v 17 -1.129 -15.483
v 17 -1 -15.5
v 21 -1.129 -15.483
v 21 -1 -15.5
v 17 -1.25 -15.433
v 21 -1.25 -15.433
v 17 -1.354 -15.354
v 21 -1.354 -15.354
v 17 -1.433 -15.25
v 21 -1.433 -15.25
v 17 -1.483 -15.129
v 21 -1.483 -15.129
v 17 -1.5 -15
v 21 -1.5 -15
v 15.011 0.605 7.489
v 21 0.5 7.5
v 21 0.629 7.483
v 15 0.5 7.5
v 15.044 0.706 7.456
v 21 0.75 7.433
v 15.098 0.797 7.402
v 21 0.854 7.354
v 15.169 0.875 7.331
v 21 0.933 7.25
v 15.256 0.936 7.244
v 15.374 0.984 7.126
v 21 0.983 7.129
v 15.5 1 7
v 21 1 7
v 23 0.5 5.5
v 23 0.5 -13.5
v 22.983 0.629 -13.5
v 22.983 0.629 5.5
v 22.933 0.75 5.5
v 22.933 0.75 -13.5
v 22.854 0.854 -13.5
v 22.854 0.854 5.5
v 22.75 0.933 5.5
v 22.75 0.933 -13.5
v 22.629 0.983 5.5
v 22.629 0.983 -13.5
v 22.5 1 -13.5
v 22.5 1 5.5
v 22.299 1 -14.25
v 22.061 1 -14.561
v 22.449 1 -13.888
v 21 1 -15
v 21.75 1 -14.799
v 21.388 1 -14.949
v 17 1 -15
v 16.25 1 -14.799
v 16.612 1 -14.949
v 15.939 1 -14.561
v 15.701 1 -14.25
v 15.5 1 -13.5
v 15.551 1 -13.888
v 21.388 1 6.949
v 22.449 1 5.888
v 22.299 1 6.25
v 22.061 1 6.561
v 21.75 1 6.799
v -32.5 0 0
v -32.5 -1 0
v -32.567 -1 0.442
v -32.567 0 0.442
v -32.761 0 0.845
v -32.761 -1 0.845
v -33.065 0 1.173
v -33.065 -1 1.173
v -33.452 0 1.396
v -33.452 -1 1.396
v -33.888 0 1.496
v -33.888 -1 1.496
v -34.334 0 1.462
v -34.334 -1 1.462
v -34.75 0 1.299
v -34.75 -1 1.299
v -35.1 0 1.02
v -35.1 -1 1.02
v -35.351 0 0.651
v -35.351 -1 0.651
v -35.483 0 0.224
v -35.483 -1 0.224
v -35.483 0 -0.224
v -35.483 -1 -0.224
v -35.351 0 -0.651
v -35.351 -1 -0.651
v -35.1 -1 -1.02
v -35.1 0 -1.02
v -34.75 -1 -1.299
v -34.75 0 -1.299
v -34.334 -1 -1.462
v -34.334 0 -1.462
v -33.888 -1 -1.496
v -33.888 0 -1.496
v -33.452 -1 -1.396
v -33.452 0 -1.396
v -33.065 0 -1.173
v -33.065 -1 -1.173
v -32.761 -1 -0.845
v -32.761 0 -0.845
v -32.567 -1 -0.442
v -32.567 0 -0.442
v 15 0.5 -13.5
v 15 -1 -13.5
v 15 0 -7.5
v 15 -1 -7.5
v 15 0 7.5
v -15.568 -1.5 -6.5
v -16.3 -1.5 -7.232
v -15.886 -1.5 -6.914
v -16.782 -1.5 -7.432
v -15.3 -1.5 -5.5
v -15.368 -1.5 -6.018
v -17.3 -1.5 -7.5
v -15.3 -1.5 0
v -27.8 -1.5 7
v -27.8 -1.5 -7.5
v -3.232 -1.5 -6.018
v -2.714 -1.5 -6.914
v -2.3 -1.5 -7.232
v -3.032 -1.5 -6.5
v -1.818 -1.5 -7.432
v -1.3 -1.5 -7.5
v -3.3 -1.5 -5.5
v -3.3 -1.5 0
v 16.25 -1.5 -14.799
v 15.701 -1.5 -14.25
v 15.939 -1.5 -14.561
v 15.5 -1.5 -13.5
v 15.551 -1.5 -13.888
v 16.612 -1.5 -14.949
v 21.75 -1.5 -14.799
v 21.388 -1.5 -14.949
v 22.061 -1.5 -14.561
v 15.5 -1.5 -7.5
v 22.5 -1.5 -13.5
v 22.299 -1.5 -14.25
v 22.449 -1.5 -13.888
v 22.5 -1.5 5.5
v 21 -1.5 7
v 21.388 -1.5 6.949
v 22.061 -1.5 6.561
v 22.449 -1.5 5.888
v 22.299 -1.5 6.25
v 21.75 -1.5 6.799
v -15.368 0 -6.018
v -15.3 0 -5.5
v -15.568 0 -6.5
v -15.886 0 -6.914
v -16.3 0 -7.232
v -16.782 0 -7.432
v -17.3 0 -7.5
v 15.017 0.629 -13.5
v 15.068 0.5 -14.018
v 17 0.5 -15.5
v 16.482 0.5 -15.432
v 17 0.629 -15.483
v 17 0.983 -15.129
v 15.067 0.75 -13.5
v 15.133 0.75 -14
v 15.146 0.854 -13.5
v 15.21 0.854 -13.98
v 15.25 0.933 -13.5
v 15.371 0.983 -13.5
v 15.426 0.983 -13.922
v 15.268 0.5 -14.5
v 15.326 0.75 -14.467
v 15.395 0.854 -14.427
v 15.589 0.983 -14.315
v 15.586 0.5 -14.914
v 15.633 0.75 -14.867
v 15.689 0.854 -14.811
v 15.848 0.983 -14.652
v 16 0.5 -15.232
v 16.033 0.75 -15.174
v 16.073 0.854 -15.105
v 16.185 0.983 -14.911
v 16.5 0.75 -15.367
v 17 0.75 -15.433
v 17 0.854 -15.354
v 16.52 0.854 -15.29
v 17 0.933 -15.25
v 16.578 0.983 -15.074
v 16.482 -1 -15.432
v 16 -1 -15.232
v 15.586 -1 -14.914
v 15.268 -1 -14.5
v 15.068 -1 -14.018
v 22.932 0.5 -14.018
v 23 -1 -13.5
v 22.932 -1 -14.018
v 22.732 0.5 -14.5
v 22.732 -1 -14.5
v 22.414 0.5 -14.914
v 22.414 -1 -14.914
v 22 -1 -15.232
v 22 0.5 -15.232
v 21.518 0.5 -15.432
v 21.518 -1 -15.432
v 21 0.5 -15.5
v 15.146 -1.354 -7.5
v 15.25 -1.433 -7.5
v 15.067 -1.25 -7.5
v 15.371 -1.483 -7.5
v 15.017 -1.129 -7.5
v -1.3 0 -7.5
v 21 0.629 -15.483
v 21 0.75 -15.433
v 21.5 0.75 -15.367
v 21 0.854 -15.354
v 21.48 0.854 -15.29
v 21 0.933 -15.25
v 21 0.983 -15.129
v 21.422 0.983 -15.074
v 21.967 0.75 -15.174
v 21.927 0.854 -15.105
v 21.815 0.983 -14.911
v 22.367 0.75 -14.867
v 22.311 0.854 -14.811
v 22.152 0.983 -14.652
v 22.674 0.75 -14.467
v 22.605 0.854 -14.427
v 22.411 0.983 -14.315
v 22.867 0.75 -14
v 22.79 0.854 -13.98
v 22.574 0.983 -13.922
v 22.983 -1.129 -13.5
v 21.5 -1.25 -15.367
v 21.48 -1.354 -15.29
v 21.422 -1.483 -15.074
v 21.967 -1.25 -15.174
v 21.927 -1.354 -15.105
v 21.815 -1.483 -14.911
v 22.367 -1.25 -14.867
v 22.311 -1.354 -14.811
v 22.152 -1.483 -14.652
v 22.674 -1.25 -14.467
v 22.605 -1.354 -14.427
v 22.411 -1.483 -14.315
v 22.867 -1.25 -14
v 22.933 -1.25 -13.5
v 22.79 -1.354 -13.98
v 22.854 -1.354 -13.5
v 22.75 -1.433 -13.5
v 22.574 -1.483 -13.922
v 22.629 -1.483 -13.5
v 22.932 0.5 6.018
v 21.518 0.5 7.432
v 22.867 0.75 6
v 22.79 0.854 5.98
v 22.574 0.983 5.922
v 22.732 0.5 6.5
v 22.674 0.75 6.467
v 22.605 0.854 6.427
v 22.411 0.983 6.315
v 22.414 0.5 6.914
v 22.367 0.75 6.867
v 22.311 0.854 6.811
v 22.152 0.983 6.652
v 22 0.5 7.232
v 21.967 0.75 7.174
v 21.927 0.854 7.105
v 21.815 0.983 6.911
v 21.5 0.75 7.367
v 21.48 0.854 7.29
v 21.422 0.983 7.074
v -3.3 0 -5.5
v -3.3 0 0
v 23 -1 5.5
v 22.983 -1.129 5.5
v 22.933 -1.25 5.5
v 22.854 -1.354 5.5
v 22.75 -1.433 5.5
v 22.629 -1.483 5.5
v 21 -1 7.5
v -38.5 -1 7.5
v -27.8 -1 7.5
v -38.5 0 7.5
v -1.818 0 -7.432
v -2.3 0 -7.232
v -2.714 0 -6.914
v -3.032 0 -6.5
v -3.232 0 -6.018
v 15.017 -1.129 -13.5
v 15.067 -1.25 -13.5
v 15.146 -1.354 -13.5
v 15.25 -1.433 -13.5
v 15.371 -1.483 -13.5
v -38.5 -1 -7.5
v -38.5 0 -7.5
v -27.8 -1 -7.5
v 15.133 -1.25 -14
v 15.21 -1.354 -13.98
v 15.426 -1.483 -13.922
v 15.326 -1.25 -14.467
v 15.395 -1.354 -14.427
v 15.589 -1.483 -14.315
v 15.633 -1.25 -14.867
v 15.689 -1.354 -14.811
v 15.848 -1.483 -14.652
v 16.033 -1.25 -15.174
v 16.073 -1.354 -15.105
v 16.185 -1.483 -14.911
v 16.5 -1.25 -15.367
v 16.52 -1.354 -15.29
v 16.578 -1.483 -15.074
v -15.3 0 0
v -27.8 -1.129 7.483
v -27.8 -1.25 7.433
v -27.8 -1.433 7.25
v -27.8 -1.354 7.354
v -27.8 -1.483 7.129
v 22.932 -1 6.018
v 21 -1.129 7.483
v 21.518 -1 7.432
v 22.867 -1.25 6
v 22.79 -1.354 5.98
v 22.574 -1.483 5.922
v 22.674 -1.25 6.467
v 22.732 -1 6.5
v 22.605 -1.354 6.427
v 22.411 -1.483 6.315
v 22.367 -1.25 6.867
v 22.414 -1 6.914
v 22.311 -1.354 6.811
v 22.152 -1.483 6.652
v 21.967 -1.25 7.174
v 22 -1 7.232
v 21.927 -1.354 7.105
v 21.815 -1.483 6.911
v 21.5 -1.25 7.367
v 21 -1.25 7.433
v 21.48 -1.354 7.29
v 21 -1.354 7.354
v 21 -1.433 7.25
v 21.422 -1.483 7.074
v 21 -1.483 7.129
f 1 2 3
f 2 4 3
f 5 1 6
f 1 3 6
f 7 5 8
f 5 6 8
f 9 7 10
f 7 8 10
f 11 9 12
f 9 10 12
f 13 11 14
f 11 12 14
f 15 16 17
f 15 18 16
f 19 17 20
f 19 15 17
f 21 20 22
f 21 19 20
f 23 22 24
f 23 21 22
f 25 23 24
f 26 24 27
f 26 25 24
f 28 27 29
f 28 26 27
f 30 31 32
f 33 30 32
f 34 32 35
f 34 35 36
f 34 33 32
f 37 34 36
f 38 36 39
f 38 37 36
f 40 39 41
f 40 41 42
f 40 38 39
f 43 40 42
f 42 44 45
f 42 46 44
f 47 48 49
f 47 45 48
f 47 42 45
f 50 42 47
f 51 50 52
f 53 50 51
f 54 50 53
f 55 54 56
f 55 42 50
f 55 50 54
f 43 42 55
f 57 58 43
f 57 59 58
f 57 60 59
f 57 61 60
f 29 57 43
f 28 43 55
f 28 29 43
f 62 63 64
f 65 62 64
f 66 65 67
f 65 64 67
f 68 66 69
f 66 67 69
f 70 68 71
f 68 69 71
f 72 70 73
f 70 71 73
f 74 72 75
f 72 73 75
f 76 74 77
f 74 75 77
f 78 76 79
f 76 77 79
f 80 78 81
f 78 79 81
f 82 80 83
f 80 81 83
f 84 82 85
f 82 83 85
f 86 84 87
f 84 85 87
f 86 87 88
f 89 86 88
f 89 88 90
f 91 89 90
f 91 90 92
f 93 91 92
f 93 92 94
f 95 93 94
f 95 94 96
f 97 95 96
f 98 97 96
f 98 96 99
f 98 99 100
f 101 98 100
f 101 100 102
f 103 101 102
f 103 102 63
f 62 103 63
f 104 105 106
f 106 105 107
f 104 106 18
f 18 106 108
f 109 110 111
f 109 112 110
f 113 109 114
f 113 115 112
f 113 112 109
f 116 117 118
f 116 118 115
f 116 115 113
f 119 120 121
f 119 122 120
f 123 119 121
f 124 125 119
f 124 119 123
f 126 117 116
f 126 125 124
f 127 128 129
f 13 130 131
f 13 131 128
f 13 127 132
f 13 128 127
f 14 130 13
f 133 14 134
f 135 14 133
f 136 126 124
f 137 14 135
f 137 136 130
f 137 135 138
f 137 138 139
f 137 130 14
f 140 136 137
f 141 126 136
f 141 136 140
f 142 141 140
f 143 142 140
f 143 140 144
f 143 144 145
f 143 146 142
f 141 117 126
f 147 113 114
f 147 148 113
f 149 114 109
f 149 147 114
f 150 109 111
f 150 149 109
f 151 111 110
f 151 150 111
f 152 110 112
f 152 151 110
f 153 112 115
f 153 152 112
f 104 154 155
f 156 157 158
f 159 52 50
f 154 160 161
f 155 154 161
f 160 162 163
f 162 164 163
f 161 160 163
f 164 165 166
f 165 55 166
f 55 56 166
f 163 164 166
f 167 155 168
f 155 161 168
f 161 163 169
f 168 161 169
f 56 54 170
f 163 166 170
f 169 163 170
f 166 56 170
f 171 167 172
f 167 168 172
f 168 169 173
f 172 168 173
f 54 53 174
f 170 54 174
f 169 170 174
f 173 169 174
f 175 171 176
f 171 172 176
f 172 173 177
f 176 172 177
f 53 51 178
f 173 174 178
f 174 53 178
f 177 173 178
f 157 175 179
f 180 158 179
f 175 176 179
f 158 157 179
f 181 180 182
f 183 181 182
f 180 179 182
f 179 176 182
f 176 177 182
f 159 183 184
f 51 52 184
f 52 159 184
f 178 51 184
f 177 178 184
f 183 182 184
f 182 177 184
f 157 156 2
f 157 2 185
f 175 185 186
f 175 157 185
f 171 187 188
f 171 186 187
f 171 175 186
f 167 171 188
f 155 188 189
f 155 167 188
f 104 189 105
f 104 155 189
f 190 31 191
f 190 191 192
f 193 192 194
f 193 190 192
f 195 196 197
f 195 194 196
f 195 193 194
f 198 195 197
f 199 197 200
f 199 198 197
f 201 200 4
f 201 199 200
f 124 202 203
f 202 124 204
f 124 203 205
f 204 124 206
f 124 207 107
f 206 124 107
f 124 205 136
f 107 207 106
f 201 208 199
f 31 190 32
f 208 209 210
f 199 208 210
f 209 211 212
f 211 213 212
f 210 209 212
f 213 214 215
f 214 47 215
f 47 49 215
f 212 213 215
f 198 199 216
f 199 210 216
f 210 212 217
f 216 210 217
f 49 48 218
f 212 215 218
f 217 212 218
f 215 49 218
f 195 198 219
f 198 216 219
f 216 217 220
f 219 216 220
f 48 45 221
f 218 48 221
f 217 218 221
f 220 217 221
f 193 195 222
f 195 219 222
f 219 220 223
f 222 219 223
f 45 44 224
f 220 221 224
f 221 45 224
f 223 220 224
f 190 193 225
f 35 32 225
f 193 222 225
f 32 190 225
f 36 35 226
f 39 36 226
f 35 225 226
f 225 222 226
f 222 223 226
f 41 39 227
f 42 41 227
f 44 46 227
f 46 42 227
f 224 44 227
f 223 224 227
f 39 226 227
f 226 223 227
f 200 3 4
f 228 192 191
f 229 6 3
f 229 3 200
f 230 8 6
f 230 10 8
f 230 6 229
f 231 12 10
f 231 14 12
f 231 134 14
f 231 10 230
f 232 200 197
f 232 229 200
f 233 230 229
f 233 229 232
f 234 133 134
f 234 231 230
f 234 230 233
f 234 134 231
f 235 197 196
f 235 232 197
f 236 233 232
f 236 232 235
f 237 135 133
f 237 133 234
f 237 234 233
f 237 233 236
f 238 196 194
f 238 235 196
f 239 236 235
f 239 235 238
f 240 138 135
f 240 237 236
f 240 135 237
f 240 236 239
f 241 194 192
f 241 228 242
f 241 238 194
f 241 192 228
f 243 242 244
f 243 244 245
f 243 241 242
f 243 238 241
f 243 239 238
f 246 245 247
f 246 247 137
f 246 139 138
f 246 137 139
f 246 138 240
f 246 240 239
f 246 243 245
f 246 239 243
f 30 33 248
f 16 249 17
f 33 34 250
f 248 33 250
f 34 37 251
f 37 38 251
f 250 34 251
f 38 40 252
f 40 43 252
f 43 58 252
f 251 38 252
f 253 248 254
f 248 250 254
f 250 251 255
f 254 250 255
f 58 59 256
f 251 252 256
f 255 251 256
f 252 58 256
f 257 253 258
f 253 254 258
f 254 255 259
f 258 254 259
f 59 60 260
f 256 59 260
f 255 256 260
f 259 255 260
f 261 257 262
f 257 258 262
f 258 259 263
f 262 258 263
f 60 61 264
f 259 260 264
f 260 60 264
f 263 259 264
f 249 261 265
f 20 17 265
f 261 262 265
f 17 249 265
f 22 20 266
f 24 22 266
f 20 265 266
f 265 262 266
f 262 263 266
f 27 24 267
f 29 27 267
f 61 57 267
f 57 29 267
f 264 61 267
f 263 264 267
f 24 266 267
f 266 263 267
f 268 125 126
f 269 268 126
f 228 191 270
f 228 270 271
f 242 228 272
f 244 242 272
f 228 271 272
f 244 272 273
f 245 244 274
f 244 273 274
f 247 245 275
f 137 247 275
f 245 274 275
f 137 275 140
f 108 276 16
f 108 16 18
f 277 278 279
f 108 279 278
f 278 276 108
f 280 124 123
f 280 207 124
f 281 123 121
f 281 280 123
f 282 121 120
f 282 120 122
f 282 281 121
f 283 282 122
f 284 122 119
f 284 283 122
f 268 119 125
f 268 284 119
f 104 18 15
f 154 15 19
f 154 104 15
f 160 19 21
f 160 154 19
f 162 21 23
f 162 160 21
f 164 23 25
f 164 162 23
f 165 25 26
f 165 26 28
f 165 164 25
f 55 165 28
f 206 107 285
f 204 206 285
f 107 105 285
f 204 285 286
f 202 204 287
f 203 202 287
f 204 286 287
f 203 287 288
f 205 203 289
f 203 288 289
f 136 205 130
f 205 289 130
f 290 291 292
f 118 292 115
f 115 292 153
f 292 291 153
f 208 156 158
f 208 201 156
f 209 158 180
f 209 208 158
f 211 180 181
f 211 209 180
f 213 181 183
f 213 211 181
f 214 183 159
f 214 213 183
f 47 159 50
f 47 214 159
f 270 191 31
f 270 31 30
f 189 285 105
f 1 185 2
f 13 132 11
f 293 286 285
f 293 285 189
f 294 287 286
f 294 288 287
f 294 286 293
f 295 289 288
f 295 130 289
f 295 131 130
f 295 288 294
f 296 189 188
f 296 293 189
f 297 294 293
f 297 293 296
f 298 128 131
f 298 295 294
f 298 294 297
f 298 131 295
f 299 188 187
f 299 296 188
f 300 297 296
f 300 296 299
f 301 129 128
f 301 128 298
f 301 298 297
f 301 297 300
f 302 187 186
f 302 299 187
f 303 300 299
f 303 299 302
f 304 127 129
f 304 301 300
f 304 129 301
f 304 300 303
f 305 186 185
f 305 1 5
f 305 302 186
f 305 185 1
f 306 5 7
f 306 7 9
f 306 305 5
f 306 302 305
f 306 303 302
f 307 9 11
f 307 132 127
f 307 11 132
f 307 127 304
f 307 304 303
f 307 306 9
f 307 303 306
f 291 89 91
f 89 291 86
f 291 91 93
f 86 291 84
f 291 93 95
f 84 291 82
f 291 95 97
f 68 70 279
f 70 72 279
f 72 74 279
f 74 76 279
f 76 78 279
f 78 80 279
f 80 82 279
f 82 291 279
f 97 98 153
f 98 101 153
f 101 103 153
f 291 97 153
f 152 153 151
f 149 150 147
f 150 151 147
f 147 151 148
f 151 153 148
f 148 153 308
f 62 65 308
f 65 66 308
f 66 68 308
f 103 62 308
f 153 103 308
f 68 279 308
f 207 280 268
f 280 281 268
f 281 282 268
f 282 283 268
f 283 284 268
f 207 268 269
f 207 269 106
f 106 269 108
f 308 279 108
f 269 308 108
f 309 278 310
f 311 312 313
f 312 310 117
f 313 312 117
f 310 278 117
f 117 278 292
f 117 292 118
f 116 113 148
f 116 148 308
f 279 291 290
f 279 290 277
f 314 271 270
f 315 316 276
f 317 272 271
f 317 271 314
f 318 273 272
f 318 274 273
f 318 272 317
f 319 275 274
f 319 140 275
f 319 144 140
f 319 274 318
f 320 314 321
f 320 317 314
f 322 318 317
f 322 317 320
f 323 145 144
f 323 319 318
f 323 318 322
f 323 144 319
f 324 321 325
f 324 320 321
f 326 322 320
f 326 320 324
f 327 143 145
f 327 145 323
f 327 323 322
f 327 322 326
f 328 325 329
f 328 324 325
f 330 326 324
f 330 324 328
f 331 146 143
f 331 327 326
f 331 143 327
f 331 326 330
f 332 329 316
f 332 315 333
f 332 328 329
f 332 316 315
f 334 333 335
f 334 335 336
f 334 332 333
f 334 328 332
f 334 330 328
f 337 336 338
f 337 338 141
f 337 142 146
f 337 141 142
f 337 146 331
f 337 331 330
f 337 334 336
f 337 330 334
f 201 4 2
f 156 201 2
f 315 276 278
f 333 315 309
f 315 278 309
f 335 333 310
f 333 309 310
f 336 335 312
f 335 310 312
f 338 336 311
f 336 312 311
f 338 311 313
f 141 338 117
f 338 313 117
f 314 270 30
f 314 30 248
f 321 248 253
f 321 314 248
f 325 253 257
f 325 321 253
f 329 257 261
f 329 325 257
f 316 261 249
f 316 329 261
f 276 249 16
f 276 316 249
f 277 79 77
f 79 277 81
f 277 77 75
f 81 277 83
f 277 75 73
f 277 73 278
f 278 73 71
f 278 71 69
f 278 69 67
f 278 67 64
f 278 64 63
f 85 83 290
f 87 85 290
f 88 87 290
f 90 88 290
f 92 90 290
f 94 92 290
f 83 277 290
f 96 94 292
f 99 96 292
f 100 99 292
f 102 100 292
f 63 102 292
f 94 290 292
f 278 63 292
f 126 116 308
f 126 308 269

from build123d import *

# Parameters (mm, degrees)
F0_W      = 63.5
F0_H      = 15
F1_DEPTH  = 1.5
F2_W      = 10
F2_H      = 8
F3_DEPTH  = 1.5
F4_W      = 12
F4_H      = 7.5
F5_DEPTH  = 1.501
F6_R      = 1.5
F7_DEPTH  = 1.501
F8_W      = 10.7
F8_H      = 0.5
F9_DEPTH  = 15.001
F10_W     = 2
F10_H     = 1.5
F11_DEPTH = 23.001
F12_W     = 8
F12_H     = 23
F13_DEPTH = 1
F14_R     = 2
F15_R     = 0.5


with BuildPart() as f1:
    # F0 (on Front) → F1 (new body)
    with BuildSketch(Plane.XZ):
        with Locations((-6.75, 0)):
            Rectangle(F0_W, F0_H)
    extrude(amount=F1_DEPTH)

    # F2 (on face) → F3 (join, through all)
    with BuildSketch(Plane.XZ.offset(1.5)):
        with Locations((20, -11.5)):
            Rectangle(F2_W, F2_H)
    extrude(amount=-F3_DEPTH)

    # F4 (on face) → F5 (cut, through all)
    with BuildSketch(Plane.XZ.offset(1.5)):
        with Locations((-9.3, -3.75)):
            Rectangle(F4_W, F4_H)
    extrude(amount=-F5_DEPTH, mode=Mode.SUBTRACT)

    # F6 (on face) → F7 (cut, through all)
    with BuildSketch(Plane.XZ.offset(1.5)):
        with Locations((-34, 0)):
            Circle(F6_R)
    extrude(amount=-F7_DEPTH, mode=Mode.SUBTRACT)

    # F8 (on face) → F9 (cut, through all)
    with BuildSketch(Plane(origin=(0, 0, -7.5), x_dir=(1, 0, 0), z_dir=(0, 0, -1))):
        with Locations((-33.15, 1.25)):
            Rectangle(F8_W, F8_H)
    extrude(amount=-F9_DEPTH, mode=Mode.SUBTRACT)

    # F10 (on face) → F11 (cut, through all)
    with BuildSketch(Plane(origin=(0, 0, -15.5), x_dir=(1, 0, 0), z_dir=(0, 0, -1))):
        with Locations((24, 0.75)):
            Rectangle(F10_W, F10_H)
    extrude(amount=-F11_DEPTH, mode=Mode.SUBTRACT)

    # F12 (on face) → F13 (join)
    with BuildSketch(Plane(origin=(0, 0, 0), x_dir=(-1, 0, 0), z_dir=(0, 1, 0))):
        with Locations((-19, -4)):
            Rectangle(F12_W, F12_H)
    extrude(amount=F13_DEPTH)

    # F14
    f14_edges = [f1.edges().sort_by_distance(p)[0] for p in [
        (15, -0.25, -15.5),
        (23, -0.25, -15.5),
        (23, -0.25, 7.5),
        (-3.3, -0.75, -7.5),
        (-15.3, -0.75, -7.5),
    ]]
    fillet(f14_edges, radius=F14_R)

    # F15
    f15_edges = [f1.edges().sort_by_distance(p)[0] for p in [
        (23, 1, -4),
        (23, -1.5, -4),
    ]]
    fillet(f15_edges, radius=F15_R)


solid = f1.part
